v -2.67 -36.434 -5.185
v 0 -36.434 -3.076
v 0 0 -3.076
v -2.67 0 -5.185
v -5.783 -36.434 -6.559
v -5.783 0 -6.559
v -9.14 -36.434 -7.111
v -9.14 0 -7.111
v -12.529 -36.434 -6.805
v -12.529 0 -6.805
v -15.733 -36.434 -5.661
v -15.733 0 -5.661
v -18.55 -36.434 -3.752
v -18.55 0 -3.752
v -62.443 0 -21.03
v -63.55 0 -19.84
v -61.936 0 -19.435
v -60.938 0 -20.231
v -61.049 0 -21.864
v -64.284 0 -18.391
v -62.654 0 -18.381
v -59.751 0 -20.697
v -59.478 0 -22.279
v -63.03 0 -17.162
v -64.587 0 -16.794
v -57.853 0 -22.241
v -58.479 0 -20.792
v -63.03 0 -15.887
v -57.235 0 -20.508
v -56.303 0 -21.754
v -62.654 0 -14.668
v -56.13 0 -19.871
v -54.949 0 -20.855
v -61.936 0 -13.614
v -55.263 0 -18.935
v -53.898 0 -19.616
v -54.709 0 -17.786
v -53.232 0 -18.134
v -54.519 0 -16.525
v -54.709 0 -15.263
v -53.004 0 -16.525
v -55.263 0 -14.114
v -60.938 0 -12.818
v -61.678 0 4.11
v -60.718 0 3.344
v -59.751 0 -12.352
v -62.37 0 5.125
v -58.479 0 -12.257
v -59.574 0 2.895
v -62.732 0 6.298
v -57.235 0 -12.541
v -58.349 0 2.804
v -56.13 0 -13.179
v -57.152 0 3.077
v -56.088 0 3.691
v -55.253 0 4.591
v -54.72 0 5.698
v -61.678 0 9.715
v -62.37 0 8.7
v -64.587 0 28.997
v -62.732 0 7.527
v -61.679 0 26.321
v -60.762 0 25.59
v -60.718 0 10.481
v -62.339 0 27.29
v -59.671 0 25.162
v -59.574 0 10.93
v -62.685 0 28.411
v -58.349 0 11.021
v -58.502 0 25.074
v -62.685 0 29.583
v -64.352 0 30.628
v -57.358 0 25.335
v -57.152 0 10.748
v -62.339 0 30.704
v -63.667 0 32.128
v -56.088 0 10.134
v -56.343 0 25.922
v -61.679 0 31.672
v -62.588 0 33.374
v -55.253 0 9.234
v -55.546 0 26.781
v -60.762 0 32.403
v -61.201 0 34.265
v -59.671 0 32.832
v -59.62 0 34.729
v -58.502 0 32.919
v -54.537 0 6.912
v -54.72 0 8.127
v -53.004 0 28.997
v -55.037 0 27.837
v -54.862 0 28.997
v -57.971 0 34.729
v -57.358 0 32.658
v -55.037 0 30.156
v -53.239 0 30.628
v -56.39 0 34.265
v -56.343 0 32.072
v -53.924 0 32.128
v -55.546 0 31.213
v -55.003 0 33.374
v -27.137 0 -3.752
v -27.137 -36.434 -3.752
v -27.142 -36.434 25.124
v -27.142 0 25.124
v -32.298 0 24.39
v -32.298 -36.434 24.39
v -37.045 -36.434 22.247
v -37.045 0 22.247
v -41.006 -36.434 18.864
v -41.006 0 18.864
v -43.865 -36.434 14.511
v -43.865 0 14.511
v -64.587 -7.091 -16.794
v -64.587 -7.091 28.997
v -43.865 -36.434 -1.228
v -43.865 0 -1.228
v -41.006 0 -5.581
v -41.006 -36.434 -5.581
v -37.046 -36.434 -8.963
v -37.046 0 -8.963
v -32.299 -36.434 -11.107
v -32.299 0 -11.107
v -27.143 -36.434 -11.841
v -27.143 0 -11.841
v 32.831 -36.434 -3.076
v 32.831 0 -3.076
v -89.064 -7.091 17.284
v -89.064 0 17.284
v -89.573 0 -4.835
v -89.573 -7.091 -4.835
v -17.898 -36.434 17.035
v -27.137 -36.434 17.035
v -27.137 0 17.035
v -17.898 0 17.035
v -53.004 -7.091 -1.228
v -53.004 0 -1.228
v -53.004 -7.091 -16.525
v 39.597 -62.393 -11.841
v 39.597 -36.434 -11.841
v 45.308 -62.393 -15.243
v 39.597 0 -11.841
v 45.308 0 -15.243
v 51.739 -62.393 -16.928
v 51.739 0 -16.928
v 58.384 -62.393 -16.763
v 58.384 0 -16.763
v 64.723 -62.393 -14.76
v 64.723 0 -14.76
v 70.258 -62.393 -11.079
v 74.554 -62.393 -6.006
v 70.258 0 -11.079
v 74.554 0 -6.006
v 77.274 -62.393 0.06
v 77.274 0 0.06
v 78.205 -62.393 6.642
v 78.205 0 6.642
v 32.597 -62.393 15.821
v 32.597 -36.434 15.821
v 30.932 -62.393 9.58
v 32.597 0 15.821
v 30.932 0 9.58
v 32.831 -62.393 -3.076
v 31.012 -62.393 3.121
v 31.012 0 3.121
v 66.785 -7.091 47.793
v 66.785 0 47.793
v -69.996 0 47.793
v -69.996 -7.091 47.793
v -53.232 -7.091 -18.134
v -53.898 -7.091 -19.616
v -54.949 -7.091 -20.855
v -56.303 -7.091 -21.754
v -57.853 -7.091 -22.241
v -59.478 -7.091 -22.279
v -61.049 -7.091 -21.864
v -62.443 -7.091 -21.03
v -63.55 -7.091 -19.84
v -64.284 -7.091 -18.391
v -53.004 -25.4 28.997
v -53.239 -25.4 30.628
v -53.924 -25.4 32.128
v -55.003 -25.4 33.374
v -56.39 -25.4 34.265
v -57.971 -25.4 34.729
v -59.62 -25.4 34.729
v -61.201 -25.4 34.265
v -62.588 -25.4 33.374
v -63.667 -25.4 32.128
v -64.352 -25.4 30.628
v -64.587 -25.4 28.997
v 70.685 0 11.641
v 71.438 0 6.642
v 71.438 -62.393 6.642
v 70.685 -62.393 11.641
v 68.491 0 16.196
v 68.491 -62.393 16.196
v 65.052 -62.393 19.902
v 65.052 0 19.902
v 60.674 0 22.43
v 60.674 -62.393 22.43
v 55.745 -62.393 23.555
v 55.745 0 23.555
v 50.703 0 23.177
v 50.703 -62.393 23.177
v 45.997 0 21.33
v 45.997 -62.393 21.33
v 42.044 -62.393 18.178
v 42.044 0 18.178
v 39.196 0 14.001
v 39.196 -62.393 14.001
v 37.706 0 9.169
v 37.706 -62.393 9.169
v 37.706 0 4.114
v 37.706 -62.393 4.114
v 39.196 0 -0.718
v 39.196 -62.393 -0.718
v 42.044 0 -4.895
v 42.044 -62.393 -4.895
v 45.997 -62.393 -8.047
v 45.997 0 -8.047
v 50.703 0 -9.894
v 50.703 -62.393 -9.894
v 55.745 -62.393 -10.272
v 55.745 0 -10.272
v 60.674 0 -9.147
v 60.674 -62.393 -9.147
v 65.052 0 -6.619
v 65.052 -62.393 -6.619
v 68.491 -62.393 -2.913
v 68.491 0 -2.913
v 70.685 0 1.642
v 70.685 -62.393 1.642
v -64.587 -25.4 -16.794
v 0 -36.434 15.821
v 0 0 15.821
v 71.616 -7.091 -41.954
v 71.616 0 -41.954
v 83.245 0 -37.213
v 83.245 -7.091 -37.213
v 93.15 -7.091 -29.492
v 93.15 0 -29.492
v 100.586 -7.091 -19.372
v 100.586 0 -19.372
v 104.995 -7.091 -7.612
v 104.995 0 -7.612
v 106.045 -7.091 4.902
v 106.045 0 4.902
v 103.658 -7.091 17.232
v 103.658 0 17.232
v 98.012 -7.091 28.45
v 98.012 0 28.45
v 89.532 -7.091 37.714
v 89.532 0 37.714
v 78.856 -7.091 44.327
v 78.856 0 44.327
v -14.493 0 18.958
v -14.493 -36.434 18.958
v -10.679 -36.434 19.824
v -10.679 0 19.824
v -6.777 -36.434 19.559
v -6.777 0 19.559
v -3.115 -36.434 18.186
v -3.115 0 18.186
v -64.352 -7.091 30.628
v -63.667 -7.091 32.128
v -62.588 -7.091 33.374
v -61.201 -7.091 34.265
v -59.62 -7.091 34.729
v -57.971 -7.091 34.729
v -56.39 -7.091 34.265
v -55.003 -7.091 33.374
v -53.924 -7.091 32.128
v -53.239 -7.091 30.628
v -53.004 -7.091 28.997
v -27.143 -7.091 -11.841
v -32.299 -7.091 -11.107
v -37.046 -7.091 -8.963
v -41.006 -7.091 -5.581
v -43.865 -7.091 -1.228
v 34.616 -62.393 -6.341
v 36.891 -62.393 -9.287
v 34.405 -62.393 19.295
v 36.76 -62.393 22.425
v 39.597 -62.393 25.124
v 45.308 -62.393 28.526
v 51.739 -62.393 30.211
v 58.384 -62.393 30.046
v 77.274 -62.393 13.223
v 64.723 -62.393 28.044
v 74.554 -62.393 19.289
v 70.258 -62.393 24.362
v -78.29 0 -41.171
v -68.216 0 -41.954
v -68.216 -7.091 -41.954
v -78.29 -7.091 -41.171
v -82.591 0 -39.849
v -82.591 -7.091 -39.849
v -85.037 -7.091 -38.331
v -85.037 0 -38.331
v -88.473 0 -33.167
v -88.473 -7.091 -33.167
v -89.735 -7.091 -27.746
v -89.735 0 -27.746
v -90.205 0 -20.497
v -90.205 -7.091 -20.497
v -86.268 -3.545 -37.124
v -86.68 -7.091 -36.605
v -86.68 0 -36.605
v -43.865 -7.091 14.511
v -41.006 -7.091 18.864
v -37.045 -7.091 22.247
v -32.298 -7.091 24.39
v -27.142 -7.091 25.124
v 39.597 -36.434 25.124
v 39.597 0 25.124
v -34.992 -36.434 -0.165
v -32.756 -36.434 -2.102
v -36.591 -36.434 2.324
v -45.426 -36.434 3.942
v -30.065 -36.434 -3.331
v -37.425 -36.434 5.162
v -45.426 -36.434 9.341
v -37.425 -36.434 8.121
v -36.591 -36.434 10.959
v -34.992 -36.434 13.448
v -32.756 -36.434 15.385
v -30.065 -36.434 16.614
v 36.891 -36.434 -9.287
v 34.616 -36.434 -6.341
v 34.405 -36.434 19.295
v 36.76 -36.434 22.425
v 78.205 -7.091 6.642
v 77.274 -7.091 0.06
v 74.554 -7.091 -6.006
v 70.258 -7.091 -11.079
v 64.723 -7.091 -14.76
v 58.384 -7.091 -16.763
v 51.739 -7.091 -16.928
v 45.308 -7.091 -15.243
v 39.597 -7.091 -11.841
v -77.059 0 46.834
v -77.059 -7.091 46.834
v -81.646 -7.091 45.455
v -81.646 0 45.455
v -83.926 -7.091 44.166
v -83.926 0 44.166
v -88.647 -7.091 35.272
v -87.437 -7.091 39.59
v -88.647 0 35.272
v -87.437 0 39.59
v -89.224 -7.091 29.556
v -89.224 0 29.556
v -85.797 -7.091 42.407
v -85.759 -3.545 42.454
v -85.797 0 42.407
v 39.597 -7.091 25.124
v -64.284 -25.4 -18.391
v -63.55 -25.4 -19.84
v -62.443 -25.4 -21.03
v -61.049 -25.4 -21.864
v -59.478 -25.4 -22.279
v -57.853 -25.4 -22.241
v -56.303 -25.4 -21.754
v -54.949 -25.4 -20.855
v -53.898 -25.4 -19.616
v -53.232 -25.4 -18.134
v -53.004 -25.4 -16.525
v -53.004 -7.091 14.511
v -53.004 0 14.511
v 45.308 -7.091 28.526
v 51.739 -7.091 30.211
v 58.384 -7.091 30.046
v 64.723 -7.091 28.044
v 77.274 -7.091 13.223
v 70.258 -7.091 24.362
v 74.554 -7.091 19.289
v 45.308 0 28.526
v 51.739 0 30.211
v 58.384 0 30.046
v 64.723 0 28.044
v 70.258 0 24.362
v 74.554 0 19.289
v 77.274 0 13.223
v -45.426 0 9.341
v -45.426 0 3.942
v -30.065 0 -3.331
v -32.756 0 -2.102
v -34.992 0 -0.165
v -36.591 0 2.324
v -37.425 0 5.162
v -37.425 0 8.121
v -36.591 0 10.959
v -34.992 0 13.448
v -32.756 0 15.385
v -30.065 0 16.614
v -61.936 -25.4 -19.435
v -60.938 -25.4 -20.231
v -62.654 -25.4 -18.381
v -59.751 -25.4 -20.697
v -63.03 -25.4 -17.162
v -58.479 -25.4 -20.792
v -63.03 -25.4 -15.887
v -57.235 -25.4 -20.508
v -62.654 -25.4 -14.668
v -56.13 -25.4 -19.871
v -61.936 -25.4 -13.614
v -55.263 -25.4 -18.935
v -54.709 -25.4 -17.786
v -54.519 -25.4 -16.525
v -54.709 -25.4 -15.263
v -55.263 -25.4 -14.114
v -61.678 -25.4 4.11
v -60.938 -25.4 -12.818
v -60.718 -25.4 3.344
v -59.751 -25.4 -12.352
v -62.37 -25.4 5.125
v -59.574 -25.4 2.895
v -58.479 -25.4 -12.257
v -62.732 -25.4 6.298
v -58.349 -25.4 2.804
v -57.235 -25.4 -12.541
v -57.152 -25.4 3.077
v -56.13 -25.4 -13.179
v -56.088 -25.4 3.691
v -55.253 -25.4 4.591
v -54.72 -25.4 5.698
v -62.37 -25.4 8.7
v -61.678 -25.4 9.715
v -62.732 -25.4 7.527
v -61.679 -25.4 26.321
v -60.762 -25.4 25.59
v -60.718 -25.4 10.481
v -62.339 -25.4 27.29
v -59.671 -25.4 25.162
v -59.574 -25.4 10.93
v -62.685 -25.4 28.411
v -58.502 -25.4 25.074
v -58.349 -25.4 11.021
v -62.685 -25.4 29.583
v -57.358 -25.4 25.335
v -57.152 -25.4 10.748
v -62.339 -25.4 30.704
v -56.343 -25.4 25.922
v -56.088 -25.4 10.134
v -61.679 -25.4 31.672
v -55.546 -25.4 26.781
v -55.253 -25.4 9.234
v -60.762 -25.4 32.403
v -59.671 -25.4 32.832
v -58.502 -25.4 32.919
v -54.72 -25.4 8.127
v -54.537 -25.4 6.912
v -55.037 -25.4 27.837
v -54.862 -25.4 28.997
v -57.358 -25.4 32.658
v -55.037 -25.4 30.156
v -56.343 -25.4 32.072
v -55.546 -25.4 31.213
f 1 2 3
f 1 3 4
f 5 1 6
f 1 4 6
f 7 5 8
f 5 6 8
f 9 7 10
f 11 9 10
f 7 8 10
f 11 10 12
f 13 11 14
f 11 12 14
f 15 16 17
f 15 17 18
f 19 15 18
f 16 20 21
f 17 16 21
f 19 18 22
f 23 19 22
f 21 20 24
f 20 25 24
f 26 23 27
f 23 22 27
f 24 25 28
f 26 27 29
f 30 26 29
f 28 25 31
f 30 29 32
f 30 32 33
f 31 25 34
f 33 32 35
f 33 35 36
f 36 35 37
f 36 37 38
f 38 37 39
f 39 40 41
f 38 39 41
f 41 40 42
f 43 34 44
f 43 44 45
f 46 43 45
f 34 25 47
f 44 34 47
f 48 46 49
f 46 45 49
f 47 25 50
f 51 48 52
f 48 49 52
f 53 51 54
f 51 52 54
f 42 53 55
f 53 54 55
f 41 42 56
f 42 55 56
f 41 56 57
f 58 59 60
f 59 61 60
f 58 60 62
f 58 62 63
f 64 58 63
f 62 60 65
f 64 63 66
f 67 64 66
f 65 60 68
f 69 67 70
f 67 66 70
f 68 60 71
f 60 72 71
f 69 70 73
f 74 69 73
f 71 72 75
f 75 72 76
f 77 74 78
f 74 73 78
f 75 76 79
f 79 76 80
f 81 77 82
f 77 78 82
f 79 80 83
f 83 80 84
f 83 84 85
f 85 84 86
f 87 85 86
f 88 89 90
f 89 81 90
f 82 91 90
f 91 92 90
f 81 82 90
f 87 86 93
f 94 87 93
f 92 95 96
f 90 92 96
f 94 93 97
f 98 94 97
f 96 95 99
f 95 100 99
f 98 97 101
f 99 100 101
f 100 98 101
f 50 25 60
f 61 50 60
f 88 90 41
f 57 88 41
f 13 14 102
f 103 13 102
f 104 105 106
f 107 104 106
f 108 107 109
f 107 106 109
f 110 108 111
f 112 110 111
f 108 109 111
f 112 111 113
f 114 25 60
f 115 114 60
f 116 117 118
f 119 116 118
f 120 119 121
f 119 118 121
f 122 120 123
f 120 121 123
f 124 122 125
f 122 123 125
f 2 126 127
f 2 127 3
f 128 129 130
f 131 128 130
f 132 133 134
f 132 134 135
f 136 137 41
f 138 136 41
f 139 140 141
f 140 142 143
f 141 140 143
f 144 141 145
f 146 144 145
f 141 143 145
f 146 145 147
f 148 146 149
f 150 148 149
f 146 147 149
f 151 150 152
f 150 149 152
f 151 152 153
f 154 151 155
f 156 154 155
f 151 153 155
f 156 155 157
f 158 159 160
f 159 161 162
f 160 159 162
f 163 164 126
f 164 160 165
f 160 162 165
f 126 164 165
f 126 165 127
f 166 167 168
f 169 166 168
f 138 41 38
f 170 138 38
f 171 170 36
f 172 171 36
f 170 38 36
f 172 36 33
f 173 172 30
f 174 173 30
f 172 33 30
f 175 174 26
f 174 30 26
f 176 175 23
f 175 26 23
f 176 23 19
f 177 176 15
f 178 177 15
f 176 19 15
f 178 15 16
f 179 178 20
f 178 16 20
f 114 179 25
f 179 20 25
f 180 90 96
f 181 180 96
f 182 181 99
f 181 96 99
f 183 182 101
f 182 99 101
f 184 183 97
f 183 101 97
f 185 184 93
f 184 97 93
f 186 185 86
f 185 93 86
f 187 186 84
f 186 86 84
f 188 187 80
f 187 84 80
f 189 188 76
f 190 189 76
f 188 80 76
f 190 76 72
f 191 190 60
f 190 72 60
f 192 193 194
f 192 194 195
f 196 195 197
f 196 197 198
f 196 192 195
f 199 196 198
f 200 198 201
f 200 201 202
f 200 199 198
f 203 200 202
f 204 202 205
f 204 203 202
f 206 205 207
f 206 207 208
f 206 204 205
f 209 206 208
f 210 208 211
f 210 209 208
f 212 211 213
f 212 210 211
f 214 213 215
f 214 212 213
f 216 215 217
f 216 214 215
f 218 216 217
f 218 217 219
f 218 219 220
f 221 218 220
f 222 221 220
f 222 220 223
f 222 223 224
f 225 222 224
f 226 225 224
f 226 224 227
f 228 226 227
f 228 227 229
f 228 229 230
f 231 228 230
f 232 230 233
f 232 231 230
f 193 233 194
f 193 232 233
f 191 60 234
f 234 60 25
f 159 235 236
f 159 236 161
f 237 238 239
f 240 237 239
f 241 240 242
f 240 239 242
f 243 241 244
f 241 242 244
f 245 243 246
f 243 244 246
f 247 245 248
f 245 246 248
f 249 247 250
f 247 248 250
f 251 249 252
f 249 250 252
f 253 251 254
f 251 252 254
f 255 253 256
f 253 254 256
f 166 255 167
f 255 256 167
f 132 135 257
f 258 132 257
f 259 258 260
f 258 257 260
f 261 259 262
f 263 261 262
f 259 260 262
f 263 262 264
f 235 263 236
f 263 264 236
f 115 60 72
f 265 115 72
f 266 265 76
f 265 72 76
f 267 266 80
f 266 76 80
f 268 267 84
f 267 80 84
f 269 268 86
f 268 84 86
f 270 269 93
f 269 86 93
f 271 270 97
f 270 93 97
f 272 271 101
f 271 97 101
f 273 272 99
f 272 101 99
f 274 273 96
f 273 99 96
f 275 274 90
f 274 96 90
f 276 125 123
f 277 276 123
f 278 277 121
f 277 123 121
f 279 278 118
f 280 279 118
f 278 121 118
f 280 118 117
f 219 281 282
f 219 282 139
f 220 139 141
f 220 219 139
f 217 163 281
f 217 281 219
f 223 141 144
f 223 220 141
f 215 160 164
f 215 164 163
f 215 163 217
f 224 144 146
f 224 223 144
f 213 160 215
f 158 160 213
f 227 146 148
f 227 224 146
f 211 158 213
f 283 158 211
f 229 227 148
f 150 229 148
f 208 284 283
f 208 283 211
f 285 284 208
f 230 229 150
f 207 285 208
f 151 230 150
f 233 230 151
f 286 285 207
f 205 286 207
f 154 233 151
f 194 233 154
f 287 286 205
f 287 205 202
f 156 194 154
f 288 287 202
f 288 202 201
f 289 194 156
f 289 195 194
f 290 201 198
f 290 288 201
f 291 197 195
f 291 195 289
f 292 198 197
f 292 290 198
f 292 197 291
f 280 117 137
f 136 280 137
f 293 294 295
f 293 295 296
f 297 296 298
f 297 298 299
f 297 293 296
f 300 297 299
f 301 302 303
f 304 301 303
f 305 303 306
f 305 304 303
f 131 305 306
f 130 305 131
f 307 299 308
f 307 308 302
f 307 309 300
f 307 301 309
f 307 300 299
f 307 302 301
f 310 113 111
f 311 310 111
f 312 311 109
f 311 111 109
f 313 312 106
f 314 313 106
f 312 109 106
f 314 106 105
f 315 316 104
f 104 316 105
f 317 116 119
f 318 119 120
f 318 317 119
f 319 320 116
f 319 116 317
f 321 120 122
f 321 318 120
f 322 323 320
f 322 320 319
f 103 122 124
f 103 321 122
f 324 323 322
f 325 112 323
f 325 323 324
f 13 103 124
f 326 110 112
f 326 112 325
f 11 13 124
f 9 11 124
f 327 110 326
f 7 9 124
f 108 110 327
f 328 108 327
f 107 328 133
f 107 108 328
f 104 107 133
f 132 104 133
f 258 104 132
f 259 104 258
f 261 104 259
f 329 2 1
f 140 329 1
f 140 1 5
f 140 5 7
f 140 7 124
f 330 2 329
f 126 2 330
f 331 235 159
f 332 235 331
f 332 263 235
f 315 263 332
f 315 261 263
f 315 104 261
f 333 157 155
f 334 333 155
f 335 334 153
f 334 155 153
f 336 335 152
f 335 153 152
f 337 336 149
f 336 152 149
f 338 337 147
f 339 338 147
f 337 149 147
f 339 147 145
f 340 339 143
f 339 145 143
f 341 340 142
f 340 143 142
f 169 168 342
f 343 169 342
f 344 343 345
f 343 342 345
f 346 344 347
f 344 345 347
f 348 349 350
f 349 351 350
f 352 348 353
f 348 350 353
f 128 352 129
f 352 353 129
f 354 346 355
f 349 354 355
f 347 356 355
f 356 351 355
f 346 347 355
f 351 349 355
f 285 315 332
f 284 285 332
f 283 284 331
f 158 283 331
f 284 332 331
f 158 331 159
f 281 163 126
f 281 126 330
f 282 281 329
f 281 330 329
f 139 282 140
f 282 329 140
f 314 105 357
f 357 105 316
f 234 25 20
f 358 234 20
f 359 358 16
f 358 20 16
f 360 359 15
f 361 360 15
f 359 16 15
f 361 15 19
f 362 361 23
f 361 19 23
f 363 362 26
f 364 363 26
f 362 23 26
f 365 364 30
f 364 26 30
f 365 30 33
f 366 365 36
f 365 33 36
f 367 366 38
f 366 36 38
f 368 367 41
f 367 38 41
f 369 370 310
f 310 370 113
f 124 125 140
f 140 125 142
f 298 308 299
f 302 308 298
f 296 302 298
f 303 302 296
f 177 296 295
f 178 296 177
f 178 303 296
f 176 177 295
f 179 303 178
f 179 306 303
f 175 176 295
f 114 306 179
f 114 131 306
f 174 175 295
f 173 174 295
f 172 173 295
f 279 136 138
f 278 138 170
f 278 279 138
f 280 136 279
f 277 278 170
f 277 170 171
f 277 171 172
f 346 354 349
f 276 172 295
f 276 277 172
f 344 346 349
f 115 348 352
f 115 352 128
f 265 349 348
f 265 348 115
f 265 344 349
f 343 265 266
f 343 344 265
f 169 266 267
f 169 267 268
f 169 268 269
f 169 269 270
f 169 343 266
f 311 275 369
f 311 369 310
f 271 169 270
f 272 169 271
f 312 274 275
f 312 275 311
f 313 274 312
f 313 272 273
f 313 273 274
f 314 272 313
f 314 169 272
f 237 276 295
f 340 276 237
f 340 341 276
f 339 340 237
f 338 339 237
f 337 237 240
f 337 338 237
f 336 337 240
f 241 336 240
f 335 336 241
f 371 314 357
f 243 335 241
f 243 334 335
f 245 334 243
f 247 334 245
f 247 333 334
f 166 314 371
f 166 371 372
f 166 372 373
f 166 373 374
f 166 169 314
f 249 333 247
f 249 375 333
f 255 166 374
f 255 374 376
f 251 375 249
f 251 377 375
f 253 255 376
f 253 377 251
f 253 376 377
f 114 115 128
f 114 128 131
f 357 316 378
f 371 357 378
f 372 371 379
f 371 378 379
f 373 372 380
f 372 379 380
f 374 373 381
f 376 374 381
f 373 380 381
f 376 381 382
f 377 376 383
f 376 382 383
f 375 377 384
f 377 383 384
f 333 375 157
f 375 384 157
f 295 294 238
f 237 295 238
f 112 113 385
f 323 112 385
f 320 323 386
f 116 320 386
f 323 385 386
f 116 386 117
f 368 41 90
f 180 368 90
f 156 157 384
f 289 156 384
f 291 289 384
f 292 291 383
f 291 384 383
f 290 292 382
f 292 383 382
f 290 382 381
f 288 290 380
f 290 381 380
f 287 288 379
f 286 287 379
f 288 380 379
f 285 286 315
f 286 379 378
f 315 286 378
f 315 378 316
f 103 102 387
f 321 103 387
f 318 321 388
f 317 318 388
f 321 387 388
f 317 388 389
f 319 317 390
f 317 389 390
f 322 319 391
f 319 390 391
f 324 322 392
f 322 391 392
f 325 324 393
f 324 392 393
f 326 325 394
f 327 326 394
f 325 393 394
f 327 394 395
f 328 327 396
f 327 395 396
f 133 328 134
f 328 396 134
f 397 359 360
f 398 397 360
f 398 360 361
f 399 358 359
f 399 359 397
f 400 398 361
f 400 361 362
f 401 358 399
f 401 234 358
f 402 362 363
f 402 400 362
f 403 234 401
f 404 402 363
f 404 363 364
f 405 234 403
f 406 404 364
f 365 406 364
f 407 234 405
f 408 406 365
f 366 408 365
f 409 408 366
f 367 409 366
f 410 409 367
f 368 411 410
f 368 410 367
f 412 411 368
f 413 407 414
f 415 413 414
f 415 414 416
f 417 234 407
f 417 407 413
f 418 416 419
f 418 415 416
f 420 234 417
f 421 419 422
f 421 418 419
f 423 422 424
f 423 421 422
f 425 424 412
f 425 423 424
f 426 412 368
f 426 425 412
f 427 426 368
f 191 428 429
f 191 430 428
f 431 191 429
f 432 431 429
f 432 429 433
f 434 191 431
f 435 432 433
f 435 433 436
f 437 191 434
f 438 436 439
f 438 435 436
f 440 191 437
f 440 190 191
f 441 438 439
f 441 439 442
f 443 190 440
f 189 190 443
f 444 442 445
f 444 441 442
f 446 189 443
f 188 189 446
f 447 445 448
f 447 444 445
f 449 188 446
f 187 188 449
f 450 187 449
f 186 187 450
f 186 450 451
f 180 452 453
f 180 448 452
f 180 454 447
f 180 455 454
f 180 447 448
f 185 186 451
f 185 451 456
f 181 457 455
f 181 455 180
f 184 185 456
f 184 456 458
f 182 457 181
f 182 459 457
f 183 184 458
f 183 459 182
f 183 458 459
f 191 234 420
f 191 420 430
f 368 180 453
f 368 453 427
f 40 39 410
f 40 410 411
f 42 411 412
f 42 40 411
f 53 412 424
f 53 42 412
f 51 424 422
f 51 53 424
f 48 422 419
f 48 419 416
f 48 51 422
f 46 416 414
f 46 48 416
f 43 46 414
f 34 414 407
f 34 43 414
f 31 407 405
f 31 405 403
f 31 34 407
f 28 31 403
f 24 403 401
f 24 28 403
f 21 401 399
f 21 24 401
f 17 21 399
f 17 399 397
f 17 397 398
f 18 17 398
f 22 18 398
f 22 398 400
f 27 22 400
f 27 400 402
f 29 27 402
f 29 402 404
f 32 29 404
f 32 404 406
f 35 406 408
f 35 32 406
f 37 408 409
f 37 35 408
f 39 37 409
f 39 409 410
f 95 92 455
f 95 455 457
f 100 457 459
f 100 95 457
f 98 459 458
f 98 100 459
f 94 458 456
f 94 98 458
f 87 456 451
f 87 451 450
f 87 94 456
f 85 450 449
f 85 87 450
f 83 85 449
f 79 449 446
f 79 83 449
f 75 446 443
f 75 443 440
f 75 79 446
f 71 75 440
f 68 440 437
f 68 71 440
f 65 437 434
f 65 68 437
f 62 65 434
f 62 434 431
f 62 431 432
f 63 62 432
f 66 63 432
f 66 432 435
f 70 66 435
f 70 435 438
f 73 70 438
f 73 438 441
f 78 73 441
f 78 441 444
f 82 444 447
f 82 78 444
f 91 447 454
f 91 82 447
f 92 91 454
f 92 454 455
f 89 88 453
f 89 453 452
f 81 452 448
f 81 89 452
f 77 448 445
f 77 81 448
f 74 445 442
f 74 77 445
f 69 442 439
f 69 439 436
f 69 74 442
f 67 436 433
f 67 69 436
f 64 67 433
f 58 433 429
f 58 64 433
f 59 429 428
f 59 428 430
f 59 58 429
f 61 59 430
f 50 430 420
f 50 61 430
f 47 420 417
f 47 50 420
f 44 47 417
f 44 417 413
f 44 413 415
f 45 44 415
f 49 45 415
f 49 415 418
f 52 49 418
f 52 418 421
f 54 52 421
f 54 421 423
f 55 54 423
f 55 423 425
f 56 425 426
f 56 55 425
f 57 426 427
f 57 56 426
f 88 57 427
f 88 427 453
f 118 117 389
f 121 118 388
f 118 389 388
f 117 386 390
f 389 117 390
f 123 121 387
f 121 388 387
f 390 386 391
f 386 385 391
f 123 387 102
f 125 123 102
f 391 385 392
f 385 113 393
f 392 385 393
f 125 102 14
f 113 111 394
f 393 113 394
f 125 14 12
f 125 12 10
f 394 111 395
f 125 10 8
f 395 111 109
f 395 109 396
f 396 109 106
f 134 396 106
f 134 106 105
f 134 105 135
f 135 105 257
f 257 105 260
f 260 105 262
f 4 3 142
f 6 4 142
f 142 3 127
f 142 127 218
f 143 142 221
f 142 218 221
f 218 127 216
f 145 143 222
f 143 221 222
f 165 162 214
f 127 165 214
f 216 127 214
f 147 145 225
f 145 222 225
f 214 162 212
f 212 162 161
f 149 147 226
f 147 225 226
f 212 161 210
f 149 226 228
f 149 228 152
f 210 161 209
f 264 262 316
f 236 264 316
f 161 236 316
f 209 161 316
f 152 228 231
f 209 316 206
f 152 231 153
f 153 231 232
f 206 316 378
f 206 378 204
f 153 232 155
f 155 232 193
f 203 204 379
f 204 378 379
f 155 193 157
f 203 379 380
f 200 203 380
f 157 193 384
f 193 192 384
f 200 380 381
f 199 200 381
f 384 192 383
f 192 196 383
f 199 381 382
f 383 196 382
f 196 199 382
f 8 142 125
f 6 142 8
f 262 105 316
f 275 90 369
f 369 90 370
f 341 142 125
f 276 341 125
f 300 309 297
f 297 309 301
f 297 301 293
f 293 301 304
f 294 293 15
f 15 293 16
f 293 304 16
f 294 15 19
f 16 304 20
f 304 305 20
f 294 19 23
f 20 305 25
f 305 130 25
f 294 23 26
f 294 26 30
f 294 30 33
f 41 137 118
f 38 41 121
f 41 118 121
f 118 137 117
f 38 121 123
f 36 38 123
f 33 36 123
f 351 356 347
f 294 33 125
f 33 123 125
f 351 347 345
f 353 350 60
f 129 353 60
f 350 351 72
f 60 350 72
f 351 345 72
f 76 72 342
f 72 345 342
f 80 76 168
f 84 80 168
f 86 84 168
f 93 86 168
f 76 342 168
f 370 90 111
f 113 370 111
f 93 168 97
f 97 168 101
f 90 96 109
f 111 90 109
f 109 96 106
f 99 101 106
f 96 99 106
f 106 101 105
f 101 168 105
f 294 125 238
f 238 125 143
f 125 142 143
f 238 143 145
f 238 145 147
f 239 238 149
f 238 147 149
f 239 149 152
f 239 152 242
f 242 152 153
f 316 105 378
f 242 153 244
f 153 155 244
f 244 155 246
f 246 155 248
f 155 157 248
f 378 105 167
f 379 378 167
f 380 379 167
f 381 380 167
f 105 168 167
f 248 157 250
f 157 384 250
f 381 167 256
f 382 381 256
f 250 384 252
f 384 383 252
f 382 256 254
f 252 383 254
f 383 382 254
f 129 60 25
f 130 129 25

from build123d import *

# Parameters (mm, degrees)
F0_R     = 4.2795303883
F0_R_2   = 4.1203882692
F0_R_3   = 3.9334600098
F1_DEPTH = 25.4
F0_R_4   = 16.9610161395
F2_DEPTH = 62.39313
F3_DEPTH = 36.43448
F6_DEPTH = 7.09099


# Not quite as in the source:
# - the program builds the solid bodies; features that only make, move or delete a surface that nothing else refers to are left out


with BuildPart() as f1:
    # F0 (on Front) → F1 (new body)
    with BuildSketch(Plane.XZ):
        with BuildLine():
            ThreePointArc((-53.0043460473, 28.996894532), (-58.7955482348, 34.7880967196), (-64.5867504224, 28.996894532))
            Line((-64.5867504224, 28.996894532), (-64.5867504224, -16.7940031503))
            ThreePointArc((-64.5867504224, -16.7940031503), (-58.6639644209, -22.3174121933), (-53.0043460473, -16.5246441726))
            Line((-53.0043460473, -16.5246441726), (-53.0043460473, -1.2275470406))
            Line((-53.0043460473, -1.2275470406), (-53.0043460473, 14.5105786386))
            Line((-53.0043460473, 14.5105786386), (-53.0043460473, 28.996894532))
        make_face()
        with Locations((-58.7986803245, -16.5246441726)):
            Circle(F0_R, mode=Mode.SUBTRACT)
        with Locations((-58.6573071778, 6.9124489091)):
            Circle(F0_R_2, mode=Mode.SUBTRACT)
        with Locations((-58.7955482348, 28.996894532)):
            Circle(F0_R_3, mode=Mode.SUBTRACT)
    extrude(amount=F1_DEPTH)


with BuildPart() as f2:
    # F0 (on Front) → F2 (new body)
    with BuildSketch(Plane.XZ):
        with BuildLine():
            ThreePointArc((78.2053648656, 6.6415158399), (64.7229791348, 28.0435082172), (39.5973620512, 25.1240272913))
            ThreePointArc((39.5973620512, 25.1240272913), (35.5176279372, 20.9084727793), (32.5968303911, 15.8208336432))
            ThreePointArc((32.5968303911, 15.8208336432), (30.7511872282, 6.348009445), (32.8305982139, -3.0762595944))
            ThreePointArc((32.8305982139, -3.0762595944), (35.6955553778, -7.8588744416), (39.5973620512, -11.8409956114))
            ThreePointArc((39.5973620512, -11.8409956114), (64.7229791348, -14.7604765374), (78.2053648656, 6.6415158399))
        make_face()
        with Locations((54.4773683713, 6.6415158399)):
            Circle(F0_R_4, mode=Mode.SUBTRACT)
    extrude(amount=F2_DEPTH)

    # F0 (on Front) → F3 (join)
    with BuildSketch(Plane.XZ):
        with BuildLine():
            ThreePointArc((-27.1416550456, 25.1240272913), (-37.0452702112, 22.246695635), (-43.8653233361, 14.5105786386))
            ThreePointArc((-43.8653233361, 14.5105786386), (-45.6241665379, 6.641515799), (-43.8653233361, -1.2275470406))
            ThreePointArc((-43.8653233361, -1.2275470406), (-37.0460046869, -8.9631978878), (-27.1433948729, -11.8409956114))
            Line((-27.1433948729, -11.8409956114), (39.5973620512, -11.8409956114))
            ThreePointArc((39.5973620512, -11.8409956114), (35.6955553778, -7.8588744416), (32.8305982139, -3.0762595944))
            Line((32.8305982139, -3.0762595944), (0, -3.0762595944))
            ThreePointArc((0, -3.0762595944), (-9.1401495961, -7.1109009087), (-18.5496408035, -3.752011153))
            Line((-18.5496408035, -3.752011153), (-27.1371953138, -3.752011153))
            ThreePointArc((-27.1371953138, -3.752011153), (-37.5307223067, 6.6415158399), (-27.1371953138, 17.0350428328))
            Line((-27.1371953138, 17.0350428328), (-17.8983315824, 17.0350428328))
            ThreePointArc((-17.8983315824, 17.0350428328), (-8.7181364976, 19.8334790106), (0, 15.8208336432))
            Line((0, 15.8208336432), (32.5968303911, 15.8208336432))
            ThreePointArc((32.5968303911, 15.8208336432), (35.5176279372, 20.9084727793), (39.5973620512, 25.1240272913))
            Line((39.5973620512, 25.1240272913), (-27.1416550456, 25.1240272913))
        make_face()
    extrude(amount=F3_DEPTH)


with BuildPart() as f6:
    # F0 (on Front) → F6 (new body)
    with BuildSketch(Plane.XZ):
        with BuildLine():
            Line((-68.2164430618, -41.9541485608), (71.6157257557, -41.9541485608))
            ThreePointArc((71.6157257557, -41.9541485608), (106.0450219063, 4.9024018867), (66.7851641774, 47.7926842868))
            Line((66.7851641774, 47.7926842868), (-69.9961259961, 47.7926842868))
            add(Edge.make_bspline(
                [(-69.9961259961, 47.7926842868), (-76.2263024319, 47.1345590327), (-90.1510844896, 45.6636134143), (-89.4510040109, 27.3845536081), (-89.0641510487, 17.2838456929)],
                knots=[0, 0, 0, 0, 0.4474164414, 1, 1, 1, 1], degree=3))
            Line((-89.0641510487, 17.2838456929), (-89.5726308227, -4.835061729))
            add(Edge.make_bspline(
                [(-68.2164430618, -41.9541485608), (-75.3510688203, -41.7581987898), (-91.8886893642, -41.3039993589), (-90.4121593424, -18.0543792359), (-89.5726308227, -4.835061729)],
                knots=[0, 0, 0, 0, 0.4314179141, 1, 1, 1, 1], degree=3))
        make_face()
        with BuildLine():
            Line((-64.5867504224, -16.7940031503), (-64.5867504224, 28.996894532))
            ThreePointArc((-64.5867504224, 28.996894532), (-58.7955482348, 34.7880967196), (-53.0043460473, 28.996894532))
            Line((-53.0043460473, 28.996894532), (-53.0043460473, 14.5105786386))
            Line((-53.0043460473, 14.5105786386), (-43.8653233361, 14.5105786386))
            ThreePointArc((-43.8653233361, 14.5105786386), (-37.0452702112, 22.246695635), (-27.1416550456, 25.1240272913))
            Line((-27.1416550456, 25.1240272913), (39.5973620512, 25.1240272913))
            ThreePointArc((39.5973620512, 25.1240272913), (64.7229791348, 28.0435082172), (78.2053648656, 6.6415158399))
            ThreePointArc((78.2053648656, 6.6415158399), (64.7229791348, -14.7604765374), (39.5973620512, -11.8409956114))
            Line((39.5973620512, -11.8409956114), (-27.1433948729, -11.8409956114))
            ThreePointArc((-27.1433948729, -11.8409956114), (-37.0460046869, -8.9631978878), (-43.8653233361, -1.2275470406))
            Line((-43.8653233361, -1.2275470406), (-53.0043460473, -1.2275470406))
            Line((-53.0043460473, -1.2275470406), (-53.0043460473, -16.5246441726))
            ThreePointArc((-53.0043460473, -16.5246441726), (-58.6639644209, -22.3174121933), (-64.5867504224, -16.7940031503))
        make_face(mode=Mode.SUBTRACT)
    extrude(amount=F6_DEPTH)


solid = Compound([f1.part, f2.part, f6.part])
